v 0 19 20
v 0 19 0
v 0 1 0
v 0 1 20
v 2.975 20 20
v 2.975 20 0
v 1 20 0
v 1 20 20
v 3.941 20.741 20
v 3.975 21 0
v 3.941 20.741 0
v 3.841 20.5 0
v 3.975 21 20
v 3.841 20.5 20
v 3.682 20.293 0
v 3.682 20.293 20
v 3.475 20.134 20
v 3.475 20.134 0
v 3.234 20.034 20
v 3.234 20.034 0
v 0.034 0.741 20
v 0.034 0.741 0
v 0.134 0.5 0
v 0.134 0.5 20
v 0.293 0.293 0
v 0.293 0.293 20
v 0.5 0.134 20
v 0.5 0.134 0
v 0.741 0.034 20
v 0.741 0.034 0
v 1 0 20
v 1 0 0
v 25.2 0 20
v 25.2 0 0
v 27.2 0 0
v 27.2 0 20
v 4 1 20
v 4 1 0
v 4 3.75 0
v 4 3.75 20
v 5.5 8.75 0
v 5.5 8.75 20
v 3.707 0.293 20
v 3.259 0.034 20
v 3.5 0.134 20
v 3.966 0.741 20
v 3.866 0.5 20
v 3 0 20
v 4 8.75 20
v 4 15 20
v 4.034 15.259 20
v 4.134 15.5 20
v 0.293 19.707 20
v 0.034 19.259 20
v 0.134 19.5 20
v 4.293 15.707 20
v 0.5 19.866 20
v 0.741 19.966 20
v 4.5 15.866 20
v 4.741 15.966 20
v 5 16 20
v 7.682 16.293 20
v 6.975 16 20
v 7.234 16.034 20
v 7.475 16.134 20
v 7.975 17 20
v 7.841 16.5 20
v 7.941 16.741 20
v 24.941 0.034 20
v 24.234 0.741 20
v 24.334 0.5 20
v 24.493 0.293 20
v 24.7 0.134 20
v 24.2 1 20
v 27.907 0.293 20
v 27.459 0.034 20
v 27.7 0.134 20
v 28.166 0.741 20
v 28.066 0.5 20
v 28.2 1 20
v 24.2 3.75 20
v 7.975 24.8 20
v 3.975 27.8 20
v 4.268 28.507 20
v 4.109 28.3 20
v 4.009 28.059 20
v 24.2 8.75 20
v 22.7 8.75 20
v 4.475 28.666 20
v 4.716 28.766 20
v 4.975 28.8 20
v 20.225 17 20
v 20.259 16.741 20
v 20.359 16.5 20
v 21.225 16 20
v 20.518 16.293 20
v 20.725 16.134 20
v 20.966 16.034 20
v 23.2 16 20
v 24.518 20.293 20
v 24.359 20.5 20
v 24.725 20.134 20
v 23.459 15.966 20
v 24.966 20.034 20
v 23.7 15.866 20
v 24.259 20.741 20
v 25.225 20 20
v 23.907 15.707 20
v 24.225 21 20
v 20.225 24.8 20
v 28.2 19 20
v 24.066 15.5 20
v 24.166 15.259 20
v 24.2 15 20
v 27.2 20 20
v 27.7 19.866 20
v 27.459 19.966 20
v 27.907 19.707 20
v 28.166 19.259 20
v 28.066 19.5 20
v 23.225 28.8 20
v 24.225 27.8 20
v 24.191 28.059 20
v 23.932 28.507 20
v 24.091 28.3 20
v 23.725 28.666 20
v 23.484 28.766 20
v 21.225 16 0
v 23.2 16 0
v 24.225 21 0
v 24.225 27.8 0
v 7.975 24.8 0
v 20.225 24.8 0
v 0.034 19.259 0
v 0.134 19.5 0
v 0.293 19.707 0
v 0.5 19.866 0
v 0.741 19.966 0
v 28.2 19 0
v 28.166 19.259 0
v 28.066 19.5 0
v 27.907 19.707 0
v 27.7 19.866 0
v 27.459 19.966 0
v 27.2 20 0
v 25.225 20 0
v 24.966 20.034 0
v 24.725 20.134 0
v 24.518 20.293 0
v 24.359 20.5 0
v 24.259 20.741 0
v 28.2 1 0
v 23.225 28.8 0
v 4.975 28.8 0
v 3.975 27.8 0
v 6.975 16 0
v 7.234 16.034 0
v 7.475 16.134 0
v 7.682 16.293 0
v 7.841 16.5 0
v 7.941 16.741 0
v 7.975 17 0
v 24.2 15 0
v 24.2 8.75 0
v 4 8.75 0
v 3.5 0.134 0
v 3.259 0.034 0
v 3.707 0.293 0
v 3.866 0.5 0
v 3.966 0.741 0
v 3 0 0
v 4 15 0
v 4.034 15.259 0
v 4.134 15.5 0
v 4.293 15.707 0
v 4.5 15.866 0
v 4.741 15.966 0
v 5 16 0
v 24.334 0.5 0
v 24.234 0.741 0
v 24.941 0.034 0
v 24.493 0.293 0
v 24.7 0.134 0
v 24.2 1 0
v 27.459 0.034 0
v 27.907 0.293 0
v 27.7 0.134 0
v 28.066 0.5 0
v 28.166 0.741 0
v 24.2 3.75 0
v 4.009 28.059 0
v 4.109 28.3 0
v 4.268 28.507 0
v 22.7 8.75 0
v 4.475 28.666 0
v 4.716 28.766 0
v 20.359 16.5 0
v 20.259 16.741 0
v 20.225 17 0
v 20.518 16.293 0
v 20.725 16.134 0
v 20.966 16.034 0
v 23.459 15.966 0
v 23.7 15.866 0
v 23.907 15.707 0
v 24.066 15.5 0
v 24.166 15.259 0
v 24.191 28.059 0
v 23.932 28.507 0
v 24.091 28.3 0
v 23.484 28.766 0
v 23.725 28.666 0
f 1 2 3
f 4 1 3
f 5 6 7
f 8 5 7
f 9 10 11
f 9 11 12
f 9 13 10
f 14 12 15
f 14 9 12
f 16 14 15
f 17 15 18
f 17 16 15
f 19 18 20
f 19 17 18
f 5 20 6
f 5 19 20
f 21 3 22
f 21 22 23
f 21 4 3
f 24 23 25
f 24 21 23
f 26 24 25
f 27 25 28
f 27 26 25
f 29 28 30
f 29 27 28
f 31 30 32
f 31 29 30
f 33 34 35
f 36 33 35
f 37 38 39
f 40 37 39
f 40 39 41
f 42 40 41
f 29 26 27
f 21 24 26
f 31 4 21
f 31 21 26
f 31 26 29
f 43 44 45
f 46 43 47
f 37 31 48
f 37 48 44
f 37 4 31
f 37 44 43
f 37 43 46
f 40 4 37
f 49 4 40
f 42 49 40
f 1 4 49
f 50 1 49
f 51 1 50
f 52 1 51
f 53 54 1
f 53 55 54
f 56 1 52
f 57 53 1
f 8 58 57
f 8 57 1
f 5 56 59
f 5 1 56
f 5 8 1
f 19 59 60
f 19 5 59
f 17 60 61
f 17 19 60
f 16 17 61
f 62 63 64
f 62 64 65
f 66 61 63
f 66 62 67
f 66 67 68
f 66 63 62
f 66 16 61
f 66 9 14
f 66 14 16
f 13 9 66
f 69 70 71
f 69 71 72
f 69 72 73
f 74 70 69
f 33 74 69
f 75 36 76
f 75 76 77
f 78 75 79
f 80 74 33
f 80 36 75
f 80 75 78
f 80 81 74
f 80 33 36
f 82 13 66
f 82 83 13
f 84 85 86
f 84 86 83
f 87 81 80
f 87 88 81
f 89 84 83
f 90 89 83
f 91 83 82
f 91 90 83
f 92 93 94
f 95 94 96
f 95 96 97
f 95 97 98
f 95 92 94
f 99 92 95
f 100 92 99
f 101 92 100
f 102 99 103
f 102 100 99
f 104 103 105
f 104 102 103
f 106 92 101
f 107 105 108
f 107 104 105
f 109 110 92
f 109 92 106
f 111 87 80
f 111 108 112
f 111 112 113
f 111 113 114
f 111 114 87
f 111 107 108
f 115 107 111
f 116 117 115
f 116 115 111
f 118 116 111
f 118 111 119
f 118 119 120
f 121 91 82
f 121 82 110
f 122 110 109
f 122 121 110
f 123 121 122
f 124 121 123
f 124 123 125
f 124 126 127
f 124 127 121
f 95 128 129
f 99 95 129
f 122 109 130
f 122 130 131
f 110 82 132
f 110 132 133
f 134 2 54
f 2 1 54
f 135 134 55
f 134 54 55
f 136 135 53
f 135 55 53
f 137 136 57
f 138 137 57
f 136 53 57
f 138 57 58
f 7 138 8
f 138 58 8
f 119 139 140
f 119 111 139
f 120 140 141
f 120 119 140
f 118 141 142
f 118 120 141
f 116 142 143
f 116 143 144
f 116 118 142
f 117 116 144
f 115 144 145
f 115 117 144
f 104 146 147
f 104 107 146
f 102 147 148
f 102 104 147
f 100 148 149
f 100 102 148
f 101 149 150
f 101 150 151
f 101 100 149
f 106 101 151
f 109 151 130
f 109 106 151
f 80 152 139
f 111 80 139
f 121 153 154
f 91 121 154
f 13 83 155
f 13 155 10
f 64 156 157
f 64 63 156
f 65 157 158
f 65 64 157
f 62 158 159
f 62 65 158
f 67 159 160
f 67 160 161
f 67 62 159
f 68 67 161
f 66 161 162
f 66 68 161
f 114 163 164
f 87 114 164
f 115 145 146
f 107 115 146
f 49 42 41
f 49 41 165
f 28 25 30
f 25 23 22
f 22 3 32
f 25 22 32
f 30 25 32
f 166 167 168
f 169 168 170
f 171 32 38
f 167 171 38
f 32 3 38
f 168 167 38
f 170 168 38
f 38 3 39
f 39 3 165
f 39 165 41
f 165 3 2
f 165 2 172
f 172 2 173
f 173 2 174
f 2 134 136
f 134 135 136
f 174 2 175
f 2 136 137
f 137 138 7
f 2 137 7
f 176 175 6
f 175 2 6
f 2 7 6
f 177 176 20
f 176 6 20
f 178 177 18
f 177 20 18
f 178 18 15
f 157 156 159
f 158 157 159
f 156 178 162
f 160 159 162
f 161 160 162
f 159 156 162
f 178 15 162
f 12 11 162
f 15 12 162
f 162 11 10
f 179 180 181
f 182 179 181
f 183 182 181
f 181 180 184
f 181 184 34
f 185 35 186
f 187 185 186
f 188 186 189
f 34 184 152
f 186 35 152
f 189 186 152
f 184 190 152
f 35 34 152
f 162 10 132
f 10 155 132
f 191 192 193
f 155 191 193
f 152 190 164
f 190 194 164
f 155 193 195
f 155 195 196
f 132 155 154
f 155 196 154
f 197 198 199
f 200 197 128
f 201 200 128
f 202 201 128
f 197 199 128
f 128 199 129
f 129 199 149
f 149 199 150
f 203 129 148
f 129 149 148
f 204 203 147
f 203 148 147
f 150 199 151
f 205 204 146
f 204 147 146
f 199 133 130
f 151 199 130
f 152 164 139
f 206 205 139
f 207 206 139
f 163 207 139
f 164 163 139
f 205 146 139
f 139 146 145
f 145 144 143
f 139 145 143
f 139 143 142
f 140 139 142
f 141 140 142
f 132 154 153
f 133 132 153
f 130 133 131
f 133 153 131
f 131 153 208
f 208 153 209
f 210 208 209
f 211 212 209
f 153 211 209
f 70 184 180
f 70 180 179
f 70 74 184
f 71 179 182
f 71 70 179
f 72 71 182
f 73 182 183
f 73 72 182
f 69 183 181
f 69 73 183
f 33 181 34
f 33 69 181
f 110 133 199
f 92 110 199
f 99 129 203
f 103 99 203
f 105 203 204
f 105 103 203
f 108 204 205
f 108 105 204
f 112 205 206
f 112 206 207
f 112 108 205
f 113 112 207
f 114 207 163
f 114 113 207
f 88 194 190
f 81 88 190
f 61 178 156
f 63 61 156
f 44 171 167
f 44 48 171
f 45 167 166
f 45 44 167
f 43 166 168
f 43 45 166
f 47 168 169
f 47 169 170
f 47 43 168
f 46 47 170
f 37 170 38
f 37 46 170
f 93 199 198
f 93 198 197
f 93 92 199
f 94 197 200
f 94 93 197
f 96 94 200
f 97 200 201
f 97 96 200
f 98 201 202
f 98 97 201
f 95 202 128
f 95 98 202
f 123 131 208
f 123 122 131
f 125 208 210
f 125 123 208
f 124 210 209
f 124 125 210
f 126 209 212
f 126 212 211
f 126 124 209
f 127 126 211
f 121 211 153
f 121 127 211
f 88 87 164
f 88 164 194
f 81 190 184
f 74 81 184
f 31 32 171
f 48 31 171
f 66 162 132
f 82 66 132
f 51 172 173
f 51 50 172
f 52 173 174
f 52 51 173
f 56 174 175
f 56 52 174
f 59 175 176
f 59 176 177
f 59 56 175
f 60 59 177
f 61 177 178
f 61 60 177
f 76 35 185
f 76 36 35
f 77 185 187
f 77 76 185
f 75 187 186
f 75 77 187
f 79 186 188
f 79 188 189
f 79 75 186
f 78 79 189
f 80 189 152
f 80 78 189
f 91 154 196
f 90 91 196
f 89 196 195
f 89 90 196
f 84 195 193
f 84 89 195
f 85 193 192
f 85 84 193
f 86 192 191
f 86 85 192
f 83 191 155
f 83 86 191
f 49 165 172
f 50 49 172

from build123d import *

# Parameters (mm, degrees)
F0_DEPTH = 20
F4_R     = 1
F2_DEPTH = 20


with BuildPart() as f0:
    # F3 (on Top) → F0 (new body)
    with BuildSketch(Plane.XY):
        Polygon((0, 20), (0, 0), (4, 0), (4, 16), (7.975, 16), (7.975, 24.8), (20.225, 24.8), (20.225, 16), (24.2, 16), (24.2, 0), (28.2, 0), (28.2, 20), (24.225, 20), (24.225, 28.8), (3.975, 28.8), (3.975, 20), align=None)
    extrude(amount=F0_DEPTH)

    # F4
    f4_edges = [f0.edges().sort_by_distance(p)[0] for p in [
        (4, 16, 10),
        (24.2, 16, 10),
        (7.975, 16, 10),
        (20.225, 16, 10),
        (0, 0, 10),
        (4, 0, 10),
        (24.2, 0, 10),
        (28.2, 0, 10),
        (0, 20, 10),
        (3.975, 28.8, 10),
        (3.975, 20, 10),
        (24.225, 28.8, 10),
        (24.225, 20, 10),
        (28.2, 20, 10),
    ]]
    fillet(f4_edges, radius=F4_R)

    # F1 (on face) → F2 (join)
    with BuildSketch(Plane.XY.offset(20)):
        Polygon((5.5, 8.75), (4, 8.75), (4, 3.75), align=None)
        Polygon((24.2, 3.75), (24.2, 8.75), (22.7, 8.75), align=None)
    extrude(amount=-F2_DEPTH)


solid = f0.part
